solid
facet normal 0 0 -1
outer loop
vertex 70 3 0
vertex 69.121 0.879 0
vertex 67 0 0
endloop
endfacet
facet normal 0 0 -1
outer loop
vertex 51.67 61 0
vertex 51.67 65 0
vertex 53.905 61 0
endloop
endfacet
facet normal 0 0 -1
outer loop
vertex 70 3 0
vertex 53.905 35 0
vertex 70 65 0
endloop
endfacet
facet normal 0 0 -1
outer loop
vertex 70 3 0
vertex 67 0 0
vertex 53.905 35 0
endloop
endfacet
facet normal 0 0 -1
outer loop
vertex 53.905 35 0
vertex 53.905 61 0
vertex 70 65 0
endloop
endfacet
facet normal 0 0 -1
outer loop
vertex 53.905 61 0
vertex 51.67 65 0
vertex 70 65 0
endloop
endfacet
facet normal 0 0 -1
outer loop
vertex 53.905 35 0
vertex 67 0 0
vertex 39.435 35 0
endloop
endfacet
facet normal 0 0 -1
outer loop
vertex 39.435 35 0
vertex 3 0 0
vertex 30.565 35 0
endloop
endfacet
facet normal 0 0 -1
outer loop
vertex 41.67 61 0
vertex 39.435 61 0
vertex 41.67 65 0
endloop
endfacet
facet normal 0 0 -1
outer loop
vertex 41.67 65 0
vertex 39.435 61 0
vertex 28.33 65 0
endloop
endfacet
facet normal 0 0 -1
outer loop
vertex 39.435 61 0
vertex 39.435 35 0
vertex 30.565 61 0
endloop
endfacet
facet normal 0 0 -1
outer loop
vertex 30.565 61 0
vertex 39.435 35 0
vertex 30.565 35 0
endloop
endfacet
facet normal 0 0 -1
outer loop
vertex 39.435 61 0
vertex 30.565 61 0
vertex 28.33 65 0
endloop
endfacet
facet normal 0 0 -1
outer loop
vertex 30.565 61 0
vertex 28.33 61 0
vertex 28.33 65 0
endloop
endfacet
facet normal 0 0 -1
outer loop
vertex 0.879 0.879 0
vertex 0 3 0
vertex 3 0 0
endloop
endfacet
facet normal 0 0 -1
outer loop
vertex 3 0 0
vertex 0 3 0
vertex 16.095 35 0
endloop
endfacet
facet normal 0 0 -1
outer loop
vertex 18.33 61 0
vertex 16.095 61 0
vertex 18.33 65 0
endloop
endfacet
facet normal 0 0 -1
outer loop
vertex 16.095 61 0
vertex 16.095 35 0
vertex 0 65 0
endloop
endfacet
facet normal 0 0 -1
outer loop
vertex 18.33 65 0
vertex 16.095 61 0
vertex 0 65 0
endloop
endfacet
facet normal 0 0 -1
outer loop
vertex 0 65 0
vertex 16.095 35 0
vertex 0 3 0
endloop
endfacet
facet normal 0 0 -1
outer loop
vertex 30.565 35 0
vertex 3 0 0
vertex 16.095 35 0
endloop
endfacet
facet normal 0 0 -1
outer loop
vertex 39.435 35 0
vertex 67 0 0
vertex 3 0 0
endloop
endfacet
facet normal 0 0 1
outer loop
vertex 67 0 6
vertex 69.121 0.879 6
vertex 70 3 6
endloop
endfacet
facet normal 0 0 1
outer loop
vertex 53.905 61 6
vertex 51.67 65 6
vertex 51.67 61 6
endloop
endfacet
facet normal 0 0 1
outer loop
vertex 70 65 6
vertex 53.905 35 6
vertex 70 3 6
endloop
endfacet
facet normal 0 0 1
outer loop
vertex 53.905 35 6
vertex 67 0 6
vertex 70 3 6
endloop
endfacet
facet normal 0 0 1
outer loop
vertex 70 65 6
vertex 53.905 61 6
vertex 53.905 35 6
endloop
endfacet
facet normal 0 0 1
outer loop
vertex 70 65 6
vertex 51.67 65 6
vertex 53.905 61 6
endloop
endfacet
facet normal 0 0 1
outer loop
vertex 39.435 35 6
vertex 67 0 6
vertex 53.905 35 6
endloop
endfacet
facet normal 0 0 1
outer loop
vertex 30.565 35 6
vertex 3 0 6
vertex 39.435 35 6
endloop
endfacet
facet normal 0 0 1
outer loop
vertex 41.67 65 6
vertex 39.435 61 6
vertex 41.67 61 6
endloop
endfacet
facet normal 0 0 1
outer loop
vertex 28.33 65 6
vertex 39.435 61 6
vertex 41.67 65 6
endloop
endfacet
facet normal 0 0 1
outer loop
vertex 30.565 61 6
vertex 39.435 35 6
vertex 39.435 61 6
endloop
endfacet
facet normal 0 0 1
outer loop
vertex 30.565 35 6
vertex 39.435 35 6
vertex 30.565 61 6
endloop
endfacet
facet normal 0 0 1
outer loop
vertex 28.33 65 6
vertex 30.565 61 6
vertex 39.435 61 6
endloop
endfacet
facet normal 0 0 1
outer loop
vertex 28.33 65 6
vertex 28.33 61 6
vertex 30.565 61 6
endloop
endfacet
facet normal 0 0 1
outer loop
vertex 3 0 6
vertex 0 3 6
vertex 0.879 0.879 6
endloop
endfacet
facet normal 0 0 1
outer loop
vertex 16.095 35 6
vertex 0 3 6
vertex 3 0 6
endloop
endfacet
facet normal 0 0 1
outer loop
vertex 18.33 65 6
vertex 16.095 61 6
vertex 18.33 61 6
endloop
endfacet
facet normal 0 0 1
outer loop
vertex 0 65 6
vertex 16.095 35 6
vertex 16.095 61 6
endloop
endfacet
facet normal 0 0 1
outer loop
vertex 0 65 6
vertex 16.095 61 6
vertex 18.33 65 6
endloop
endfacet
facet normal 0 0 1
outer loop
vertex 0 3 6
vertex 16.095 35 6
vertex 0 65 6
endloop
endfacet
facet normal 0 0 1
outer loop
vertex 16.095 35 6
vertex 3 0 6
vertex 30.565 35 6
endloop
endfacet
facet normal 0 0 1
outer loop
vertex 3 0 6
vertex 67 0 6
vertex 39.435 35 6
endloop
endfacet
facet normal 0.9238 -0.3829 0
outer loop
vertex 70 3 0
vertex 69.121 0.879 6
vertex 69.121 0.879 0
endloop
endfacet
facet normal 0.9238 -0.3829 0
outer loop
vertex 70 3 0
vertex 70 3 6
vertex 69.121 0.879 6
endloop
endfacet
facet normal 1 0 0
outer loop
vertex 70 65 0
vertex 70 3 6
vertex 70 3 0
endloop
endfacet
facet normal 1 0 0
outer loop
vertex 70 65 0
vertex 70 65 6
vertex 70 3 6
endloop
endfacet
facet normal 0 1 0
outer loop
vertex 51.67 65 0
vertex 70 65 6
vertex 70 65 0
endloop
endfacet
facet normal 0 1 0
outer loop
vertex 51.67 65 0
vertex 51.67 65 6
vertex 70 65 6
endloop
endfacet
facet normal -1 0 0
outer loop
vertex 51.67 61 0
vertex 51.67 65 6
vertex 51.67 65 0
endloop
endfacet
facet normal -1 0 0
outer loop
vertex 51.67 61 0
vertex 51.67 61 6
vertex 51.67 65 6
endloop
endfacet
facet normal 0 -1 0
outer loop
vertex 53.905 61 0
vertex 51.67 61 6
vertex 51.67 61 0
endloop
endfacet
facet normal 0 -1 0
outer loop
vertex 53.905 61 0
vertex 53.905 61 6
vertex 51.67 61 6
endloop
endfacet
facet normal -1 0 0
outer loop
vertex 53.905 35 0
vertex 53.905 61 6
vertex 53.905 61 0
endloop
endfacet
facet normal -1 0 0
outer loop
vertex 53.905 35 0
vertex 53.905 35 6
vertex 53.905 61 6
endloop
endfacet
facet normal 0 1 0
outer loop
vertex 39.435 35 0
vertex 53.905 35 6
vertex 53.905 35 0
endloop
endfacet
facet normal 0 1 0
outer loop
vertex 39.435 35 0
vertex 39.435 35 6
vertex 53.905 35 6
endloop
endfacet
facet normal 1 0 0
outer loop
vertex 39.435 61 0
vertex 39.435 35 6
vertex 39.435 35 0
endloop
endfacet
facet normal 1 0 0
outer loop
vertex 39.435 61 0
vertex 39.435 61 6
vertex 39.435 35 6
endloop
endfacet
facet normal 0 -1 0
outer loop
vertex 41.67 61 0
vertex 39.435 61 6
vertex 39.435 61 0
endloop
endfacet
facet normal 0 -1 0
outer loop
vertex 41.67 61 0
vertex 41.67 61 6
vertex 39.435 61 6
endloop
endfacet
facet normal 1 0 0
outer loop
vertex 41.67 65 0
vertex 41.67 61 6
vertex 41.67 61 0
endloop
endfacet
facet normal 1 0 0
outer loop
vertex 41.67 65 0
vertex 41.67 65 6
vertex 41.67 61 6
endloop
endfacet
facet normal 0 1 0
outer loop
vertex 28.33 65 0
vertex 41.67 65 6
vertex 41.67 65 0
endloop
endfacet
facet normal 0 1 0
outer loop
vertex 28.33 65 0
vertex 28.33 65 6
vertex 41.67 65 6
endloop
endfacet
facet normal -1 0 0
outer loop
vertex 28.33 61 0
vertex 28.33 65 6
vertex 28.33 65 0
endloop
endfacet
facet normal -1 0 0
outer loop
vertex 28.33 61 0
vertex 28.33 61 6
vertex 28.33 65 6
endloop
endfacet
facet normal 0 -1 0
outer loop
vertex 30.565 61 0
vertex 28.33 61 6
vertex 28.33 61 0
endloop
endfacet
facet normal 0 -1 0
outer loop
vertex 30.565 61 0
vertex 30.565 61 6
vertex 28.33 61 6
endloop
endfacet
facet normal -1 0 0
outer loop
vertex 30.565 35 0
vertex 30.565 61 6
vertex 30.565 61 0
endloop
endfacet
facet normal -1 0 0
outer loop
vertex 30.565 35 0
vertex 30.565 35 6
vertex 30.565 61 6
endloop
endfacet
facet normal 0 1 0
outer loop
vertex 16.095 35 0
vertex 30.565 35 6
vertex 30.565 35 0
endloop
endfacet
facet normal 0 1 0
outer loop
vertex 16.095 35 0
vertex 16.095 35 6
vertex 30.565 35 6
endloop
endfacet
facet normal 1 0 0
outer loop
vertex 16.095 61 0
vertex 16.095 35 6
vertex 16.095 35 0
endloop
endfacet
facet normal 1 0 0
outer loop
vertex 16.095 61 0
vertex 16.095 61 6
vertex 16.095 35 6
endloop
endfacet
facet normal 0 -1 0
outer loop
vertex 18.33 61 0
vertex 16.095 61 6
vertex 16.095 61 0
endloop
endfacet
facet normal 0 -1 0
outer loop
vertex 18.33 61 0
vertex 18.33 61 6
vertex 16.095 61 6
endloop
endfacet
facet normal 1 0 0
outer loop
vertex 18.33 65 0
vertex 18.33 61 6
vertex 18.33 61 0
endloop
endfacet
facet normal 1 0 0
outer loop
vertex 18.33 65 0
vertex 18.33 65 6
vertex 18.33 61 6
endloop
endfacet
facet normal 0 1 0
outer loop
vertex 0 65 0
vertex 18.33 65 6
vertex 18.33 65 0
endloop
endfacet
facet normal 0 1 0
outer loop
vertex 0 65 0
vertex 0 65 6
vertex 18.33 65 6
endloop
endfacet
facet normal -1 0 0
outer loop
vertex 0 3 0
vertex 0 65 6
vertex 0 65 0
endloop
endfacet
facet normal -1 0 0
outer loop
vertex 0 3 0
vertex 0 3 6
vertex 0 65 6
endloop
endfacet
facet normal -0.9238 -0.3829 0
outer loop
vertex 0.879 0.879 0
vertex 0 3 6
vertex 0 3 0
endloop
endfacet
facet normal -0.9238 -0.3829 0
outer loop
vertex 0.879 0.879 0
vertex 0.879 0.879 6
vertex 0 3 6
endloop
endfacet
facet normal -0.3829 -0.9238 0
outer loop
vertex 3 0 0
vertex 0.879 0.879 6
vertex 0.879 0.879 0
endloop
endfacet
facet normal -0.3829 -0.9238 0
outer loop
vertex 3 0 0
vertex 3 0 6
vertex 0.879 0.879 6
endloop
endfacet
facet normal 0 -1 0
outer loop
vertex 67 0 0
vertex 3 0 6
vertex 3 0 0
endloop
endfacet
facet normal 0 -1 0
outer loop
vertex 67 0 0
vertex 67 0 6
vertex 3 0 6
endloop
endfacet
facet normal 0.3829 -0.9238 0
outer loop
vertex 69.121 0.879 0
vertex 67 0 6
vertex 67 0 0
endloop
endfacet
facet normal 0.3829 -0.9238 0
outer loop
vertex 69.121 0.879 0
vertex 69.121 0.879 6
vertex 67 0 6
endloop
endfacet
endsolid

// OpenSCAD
$fn = 32;

// ----------------------------------------------------------------------
// Window plate: 70 x 65 mm, 2 open windows
// ----------------------------------------------------------------------

// --- parameters (mm) ---
profile_height = 6;       // extrusion height
profile_points = 24;      // points of the closed outline

profile = [[0, 3], [0.879, 0.879], [3, 0], [67, 0], [69.121, 0.879], [70, 3], [70, 65], [51.67, 65], [51.67, 61], [53.905, 61], [53.905, 35], [39.435, 35], [39.435, 61], [41.67, 61], [41.67, 65], [28.33, 65], [28.33, 61], [30.565, 61], [30.565, 35], [16.095, 35], [16.095, 61], [18.33, 61], [18.33, 65], [0, 65]];  // single closed polygon, 24 points, counter clockwise

// --- the one profile operation ---
linear_extrude(height = profile_height) polygon(points = profile);
